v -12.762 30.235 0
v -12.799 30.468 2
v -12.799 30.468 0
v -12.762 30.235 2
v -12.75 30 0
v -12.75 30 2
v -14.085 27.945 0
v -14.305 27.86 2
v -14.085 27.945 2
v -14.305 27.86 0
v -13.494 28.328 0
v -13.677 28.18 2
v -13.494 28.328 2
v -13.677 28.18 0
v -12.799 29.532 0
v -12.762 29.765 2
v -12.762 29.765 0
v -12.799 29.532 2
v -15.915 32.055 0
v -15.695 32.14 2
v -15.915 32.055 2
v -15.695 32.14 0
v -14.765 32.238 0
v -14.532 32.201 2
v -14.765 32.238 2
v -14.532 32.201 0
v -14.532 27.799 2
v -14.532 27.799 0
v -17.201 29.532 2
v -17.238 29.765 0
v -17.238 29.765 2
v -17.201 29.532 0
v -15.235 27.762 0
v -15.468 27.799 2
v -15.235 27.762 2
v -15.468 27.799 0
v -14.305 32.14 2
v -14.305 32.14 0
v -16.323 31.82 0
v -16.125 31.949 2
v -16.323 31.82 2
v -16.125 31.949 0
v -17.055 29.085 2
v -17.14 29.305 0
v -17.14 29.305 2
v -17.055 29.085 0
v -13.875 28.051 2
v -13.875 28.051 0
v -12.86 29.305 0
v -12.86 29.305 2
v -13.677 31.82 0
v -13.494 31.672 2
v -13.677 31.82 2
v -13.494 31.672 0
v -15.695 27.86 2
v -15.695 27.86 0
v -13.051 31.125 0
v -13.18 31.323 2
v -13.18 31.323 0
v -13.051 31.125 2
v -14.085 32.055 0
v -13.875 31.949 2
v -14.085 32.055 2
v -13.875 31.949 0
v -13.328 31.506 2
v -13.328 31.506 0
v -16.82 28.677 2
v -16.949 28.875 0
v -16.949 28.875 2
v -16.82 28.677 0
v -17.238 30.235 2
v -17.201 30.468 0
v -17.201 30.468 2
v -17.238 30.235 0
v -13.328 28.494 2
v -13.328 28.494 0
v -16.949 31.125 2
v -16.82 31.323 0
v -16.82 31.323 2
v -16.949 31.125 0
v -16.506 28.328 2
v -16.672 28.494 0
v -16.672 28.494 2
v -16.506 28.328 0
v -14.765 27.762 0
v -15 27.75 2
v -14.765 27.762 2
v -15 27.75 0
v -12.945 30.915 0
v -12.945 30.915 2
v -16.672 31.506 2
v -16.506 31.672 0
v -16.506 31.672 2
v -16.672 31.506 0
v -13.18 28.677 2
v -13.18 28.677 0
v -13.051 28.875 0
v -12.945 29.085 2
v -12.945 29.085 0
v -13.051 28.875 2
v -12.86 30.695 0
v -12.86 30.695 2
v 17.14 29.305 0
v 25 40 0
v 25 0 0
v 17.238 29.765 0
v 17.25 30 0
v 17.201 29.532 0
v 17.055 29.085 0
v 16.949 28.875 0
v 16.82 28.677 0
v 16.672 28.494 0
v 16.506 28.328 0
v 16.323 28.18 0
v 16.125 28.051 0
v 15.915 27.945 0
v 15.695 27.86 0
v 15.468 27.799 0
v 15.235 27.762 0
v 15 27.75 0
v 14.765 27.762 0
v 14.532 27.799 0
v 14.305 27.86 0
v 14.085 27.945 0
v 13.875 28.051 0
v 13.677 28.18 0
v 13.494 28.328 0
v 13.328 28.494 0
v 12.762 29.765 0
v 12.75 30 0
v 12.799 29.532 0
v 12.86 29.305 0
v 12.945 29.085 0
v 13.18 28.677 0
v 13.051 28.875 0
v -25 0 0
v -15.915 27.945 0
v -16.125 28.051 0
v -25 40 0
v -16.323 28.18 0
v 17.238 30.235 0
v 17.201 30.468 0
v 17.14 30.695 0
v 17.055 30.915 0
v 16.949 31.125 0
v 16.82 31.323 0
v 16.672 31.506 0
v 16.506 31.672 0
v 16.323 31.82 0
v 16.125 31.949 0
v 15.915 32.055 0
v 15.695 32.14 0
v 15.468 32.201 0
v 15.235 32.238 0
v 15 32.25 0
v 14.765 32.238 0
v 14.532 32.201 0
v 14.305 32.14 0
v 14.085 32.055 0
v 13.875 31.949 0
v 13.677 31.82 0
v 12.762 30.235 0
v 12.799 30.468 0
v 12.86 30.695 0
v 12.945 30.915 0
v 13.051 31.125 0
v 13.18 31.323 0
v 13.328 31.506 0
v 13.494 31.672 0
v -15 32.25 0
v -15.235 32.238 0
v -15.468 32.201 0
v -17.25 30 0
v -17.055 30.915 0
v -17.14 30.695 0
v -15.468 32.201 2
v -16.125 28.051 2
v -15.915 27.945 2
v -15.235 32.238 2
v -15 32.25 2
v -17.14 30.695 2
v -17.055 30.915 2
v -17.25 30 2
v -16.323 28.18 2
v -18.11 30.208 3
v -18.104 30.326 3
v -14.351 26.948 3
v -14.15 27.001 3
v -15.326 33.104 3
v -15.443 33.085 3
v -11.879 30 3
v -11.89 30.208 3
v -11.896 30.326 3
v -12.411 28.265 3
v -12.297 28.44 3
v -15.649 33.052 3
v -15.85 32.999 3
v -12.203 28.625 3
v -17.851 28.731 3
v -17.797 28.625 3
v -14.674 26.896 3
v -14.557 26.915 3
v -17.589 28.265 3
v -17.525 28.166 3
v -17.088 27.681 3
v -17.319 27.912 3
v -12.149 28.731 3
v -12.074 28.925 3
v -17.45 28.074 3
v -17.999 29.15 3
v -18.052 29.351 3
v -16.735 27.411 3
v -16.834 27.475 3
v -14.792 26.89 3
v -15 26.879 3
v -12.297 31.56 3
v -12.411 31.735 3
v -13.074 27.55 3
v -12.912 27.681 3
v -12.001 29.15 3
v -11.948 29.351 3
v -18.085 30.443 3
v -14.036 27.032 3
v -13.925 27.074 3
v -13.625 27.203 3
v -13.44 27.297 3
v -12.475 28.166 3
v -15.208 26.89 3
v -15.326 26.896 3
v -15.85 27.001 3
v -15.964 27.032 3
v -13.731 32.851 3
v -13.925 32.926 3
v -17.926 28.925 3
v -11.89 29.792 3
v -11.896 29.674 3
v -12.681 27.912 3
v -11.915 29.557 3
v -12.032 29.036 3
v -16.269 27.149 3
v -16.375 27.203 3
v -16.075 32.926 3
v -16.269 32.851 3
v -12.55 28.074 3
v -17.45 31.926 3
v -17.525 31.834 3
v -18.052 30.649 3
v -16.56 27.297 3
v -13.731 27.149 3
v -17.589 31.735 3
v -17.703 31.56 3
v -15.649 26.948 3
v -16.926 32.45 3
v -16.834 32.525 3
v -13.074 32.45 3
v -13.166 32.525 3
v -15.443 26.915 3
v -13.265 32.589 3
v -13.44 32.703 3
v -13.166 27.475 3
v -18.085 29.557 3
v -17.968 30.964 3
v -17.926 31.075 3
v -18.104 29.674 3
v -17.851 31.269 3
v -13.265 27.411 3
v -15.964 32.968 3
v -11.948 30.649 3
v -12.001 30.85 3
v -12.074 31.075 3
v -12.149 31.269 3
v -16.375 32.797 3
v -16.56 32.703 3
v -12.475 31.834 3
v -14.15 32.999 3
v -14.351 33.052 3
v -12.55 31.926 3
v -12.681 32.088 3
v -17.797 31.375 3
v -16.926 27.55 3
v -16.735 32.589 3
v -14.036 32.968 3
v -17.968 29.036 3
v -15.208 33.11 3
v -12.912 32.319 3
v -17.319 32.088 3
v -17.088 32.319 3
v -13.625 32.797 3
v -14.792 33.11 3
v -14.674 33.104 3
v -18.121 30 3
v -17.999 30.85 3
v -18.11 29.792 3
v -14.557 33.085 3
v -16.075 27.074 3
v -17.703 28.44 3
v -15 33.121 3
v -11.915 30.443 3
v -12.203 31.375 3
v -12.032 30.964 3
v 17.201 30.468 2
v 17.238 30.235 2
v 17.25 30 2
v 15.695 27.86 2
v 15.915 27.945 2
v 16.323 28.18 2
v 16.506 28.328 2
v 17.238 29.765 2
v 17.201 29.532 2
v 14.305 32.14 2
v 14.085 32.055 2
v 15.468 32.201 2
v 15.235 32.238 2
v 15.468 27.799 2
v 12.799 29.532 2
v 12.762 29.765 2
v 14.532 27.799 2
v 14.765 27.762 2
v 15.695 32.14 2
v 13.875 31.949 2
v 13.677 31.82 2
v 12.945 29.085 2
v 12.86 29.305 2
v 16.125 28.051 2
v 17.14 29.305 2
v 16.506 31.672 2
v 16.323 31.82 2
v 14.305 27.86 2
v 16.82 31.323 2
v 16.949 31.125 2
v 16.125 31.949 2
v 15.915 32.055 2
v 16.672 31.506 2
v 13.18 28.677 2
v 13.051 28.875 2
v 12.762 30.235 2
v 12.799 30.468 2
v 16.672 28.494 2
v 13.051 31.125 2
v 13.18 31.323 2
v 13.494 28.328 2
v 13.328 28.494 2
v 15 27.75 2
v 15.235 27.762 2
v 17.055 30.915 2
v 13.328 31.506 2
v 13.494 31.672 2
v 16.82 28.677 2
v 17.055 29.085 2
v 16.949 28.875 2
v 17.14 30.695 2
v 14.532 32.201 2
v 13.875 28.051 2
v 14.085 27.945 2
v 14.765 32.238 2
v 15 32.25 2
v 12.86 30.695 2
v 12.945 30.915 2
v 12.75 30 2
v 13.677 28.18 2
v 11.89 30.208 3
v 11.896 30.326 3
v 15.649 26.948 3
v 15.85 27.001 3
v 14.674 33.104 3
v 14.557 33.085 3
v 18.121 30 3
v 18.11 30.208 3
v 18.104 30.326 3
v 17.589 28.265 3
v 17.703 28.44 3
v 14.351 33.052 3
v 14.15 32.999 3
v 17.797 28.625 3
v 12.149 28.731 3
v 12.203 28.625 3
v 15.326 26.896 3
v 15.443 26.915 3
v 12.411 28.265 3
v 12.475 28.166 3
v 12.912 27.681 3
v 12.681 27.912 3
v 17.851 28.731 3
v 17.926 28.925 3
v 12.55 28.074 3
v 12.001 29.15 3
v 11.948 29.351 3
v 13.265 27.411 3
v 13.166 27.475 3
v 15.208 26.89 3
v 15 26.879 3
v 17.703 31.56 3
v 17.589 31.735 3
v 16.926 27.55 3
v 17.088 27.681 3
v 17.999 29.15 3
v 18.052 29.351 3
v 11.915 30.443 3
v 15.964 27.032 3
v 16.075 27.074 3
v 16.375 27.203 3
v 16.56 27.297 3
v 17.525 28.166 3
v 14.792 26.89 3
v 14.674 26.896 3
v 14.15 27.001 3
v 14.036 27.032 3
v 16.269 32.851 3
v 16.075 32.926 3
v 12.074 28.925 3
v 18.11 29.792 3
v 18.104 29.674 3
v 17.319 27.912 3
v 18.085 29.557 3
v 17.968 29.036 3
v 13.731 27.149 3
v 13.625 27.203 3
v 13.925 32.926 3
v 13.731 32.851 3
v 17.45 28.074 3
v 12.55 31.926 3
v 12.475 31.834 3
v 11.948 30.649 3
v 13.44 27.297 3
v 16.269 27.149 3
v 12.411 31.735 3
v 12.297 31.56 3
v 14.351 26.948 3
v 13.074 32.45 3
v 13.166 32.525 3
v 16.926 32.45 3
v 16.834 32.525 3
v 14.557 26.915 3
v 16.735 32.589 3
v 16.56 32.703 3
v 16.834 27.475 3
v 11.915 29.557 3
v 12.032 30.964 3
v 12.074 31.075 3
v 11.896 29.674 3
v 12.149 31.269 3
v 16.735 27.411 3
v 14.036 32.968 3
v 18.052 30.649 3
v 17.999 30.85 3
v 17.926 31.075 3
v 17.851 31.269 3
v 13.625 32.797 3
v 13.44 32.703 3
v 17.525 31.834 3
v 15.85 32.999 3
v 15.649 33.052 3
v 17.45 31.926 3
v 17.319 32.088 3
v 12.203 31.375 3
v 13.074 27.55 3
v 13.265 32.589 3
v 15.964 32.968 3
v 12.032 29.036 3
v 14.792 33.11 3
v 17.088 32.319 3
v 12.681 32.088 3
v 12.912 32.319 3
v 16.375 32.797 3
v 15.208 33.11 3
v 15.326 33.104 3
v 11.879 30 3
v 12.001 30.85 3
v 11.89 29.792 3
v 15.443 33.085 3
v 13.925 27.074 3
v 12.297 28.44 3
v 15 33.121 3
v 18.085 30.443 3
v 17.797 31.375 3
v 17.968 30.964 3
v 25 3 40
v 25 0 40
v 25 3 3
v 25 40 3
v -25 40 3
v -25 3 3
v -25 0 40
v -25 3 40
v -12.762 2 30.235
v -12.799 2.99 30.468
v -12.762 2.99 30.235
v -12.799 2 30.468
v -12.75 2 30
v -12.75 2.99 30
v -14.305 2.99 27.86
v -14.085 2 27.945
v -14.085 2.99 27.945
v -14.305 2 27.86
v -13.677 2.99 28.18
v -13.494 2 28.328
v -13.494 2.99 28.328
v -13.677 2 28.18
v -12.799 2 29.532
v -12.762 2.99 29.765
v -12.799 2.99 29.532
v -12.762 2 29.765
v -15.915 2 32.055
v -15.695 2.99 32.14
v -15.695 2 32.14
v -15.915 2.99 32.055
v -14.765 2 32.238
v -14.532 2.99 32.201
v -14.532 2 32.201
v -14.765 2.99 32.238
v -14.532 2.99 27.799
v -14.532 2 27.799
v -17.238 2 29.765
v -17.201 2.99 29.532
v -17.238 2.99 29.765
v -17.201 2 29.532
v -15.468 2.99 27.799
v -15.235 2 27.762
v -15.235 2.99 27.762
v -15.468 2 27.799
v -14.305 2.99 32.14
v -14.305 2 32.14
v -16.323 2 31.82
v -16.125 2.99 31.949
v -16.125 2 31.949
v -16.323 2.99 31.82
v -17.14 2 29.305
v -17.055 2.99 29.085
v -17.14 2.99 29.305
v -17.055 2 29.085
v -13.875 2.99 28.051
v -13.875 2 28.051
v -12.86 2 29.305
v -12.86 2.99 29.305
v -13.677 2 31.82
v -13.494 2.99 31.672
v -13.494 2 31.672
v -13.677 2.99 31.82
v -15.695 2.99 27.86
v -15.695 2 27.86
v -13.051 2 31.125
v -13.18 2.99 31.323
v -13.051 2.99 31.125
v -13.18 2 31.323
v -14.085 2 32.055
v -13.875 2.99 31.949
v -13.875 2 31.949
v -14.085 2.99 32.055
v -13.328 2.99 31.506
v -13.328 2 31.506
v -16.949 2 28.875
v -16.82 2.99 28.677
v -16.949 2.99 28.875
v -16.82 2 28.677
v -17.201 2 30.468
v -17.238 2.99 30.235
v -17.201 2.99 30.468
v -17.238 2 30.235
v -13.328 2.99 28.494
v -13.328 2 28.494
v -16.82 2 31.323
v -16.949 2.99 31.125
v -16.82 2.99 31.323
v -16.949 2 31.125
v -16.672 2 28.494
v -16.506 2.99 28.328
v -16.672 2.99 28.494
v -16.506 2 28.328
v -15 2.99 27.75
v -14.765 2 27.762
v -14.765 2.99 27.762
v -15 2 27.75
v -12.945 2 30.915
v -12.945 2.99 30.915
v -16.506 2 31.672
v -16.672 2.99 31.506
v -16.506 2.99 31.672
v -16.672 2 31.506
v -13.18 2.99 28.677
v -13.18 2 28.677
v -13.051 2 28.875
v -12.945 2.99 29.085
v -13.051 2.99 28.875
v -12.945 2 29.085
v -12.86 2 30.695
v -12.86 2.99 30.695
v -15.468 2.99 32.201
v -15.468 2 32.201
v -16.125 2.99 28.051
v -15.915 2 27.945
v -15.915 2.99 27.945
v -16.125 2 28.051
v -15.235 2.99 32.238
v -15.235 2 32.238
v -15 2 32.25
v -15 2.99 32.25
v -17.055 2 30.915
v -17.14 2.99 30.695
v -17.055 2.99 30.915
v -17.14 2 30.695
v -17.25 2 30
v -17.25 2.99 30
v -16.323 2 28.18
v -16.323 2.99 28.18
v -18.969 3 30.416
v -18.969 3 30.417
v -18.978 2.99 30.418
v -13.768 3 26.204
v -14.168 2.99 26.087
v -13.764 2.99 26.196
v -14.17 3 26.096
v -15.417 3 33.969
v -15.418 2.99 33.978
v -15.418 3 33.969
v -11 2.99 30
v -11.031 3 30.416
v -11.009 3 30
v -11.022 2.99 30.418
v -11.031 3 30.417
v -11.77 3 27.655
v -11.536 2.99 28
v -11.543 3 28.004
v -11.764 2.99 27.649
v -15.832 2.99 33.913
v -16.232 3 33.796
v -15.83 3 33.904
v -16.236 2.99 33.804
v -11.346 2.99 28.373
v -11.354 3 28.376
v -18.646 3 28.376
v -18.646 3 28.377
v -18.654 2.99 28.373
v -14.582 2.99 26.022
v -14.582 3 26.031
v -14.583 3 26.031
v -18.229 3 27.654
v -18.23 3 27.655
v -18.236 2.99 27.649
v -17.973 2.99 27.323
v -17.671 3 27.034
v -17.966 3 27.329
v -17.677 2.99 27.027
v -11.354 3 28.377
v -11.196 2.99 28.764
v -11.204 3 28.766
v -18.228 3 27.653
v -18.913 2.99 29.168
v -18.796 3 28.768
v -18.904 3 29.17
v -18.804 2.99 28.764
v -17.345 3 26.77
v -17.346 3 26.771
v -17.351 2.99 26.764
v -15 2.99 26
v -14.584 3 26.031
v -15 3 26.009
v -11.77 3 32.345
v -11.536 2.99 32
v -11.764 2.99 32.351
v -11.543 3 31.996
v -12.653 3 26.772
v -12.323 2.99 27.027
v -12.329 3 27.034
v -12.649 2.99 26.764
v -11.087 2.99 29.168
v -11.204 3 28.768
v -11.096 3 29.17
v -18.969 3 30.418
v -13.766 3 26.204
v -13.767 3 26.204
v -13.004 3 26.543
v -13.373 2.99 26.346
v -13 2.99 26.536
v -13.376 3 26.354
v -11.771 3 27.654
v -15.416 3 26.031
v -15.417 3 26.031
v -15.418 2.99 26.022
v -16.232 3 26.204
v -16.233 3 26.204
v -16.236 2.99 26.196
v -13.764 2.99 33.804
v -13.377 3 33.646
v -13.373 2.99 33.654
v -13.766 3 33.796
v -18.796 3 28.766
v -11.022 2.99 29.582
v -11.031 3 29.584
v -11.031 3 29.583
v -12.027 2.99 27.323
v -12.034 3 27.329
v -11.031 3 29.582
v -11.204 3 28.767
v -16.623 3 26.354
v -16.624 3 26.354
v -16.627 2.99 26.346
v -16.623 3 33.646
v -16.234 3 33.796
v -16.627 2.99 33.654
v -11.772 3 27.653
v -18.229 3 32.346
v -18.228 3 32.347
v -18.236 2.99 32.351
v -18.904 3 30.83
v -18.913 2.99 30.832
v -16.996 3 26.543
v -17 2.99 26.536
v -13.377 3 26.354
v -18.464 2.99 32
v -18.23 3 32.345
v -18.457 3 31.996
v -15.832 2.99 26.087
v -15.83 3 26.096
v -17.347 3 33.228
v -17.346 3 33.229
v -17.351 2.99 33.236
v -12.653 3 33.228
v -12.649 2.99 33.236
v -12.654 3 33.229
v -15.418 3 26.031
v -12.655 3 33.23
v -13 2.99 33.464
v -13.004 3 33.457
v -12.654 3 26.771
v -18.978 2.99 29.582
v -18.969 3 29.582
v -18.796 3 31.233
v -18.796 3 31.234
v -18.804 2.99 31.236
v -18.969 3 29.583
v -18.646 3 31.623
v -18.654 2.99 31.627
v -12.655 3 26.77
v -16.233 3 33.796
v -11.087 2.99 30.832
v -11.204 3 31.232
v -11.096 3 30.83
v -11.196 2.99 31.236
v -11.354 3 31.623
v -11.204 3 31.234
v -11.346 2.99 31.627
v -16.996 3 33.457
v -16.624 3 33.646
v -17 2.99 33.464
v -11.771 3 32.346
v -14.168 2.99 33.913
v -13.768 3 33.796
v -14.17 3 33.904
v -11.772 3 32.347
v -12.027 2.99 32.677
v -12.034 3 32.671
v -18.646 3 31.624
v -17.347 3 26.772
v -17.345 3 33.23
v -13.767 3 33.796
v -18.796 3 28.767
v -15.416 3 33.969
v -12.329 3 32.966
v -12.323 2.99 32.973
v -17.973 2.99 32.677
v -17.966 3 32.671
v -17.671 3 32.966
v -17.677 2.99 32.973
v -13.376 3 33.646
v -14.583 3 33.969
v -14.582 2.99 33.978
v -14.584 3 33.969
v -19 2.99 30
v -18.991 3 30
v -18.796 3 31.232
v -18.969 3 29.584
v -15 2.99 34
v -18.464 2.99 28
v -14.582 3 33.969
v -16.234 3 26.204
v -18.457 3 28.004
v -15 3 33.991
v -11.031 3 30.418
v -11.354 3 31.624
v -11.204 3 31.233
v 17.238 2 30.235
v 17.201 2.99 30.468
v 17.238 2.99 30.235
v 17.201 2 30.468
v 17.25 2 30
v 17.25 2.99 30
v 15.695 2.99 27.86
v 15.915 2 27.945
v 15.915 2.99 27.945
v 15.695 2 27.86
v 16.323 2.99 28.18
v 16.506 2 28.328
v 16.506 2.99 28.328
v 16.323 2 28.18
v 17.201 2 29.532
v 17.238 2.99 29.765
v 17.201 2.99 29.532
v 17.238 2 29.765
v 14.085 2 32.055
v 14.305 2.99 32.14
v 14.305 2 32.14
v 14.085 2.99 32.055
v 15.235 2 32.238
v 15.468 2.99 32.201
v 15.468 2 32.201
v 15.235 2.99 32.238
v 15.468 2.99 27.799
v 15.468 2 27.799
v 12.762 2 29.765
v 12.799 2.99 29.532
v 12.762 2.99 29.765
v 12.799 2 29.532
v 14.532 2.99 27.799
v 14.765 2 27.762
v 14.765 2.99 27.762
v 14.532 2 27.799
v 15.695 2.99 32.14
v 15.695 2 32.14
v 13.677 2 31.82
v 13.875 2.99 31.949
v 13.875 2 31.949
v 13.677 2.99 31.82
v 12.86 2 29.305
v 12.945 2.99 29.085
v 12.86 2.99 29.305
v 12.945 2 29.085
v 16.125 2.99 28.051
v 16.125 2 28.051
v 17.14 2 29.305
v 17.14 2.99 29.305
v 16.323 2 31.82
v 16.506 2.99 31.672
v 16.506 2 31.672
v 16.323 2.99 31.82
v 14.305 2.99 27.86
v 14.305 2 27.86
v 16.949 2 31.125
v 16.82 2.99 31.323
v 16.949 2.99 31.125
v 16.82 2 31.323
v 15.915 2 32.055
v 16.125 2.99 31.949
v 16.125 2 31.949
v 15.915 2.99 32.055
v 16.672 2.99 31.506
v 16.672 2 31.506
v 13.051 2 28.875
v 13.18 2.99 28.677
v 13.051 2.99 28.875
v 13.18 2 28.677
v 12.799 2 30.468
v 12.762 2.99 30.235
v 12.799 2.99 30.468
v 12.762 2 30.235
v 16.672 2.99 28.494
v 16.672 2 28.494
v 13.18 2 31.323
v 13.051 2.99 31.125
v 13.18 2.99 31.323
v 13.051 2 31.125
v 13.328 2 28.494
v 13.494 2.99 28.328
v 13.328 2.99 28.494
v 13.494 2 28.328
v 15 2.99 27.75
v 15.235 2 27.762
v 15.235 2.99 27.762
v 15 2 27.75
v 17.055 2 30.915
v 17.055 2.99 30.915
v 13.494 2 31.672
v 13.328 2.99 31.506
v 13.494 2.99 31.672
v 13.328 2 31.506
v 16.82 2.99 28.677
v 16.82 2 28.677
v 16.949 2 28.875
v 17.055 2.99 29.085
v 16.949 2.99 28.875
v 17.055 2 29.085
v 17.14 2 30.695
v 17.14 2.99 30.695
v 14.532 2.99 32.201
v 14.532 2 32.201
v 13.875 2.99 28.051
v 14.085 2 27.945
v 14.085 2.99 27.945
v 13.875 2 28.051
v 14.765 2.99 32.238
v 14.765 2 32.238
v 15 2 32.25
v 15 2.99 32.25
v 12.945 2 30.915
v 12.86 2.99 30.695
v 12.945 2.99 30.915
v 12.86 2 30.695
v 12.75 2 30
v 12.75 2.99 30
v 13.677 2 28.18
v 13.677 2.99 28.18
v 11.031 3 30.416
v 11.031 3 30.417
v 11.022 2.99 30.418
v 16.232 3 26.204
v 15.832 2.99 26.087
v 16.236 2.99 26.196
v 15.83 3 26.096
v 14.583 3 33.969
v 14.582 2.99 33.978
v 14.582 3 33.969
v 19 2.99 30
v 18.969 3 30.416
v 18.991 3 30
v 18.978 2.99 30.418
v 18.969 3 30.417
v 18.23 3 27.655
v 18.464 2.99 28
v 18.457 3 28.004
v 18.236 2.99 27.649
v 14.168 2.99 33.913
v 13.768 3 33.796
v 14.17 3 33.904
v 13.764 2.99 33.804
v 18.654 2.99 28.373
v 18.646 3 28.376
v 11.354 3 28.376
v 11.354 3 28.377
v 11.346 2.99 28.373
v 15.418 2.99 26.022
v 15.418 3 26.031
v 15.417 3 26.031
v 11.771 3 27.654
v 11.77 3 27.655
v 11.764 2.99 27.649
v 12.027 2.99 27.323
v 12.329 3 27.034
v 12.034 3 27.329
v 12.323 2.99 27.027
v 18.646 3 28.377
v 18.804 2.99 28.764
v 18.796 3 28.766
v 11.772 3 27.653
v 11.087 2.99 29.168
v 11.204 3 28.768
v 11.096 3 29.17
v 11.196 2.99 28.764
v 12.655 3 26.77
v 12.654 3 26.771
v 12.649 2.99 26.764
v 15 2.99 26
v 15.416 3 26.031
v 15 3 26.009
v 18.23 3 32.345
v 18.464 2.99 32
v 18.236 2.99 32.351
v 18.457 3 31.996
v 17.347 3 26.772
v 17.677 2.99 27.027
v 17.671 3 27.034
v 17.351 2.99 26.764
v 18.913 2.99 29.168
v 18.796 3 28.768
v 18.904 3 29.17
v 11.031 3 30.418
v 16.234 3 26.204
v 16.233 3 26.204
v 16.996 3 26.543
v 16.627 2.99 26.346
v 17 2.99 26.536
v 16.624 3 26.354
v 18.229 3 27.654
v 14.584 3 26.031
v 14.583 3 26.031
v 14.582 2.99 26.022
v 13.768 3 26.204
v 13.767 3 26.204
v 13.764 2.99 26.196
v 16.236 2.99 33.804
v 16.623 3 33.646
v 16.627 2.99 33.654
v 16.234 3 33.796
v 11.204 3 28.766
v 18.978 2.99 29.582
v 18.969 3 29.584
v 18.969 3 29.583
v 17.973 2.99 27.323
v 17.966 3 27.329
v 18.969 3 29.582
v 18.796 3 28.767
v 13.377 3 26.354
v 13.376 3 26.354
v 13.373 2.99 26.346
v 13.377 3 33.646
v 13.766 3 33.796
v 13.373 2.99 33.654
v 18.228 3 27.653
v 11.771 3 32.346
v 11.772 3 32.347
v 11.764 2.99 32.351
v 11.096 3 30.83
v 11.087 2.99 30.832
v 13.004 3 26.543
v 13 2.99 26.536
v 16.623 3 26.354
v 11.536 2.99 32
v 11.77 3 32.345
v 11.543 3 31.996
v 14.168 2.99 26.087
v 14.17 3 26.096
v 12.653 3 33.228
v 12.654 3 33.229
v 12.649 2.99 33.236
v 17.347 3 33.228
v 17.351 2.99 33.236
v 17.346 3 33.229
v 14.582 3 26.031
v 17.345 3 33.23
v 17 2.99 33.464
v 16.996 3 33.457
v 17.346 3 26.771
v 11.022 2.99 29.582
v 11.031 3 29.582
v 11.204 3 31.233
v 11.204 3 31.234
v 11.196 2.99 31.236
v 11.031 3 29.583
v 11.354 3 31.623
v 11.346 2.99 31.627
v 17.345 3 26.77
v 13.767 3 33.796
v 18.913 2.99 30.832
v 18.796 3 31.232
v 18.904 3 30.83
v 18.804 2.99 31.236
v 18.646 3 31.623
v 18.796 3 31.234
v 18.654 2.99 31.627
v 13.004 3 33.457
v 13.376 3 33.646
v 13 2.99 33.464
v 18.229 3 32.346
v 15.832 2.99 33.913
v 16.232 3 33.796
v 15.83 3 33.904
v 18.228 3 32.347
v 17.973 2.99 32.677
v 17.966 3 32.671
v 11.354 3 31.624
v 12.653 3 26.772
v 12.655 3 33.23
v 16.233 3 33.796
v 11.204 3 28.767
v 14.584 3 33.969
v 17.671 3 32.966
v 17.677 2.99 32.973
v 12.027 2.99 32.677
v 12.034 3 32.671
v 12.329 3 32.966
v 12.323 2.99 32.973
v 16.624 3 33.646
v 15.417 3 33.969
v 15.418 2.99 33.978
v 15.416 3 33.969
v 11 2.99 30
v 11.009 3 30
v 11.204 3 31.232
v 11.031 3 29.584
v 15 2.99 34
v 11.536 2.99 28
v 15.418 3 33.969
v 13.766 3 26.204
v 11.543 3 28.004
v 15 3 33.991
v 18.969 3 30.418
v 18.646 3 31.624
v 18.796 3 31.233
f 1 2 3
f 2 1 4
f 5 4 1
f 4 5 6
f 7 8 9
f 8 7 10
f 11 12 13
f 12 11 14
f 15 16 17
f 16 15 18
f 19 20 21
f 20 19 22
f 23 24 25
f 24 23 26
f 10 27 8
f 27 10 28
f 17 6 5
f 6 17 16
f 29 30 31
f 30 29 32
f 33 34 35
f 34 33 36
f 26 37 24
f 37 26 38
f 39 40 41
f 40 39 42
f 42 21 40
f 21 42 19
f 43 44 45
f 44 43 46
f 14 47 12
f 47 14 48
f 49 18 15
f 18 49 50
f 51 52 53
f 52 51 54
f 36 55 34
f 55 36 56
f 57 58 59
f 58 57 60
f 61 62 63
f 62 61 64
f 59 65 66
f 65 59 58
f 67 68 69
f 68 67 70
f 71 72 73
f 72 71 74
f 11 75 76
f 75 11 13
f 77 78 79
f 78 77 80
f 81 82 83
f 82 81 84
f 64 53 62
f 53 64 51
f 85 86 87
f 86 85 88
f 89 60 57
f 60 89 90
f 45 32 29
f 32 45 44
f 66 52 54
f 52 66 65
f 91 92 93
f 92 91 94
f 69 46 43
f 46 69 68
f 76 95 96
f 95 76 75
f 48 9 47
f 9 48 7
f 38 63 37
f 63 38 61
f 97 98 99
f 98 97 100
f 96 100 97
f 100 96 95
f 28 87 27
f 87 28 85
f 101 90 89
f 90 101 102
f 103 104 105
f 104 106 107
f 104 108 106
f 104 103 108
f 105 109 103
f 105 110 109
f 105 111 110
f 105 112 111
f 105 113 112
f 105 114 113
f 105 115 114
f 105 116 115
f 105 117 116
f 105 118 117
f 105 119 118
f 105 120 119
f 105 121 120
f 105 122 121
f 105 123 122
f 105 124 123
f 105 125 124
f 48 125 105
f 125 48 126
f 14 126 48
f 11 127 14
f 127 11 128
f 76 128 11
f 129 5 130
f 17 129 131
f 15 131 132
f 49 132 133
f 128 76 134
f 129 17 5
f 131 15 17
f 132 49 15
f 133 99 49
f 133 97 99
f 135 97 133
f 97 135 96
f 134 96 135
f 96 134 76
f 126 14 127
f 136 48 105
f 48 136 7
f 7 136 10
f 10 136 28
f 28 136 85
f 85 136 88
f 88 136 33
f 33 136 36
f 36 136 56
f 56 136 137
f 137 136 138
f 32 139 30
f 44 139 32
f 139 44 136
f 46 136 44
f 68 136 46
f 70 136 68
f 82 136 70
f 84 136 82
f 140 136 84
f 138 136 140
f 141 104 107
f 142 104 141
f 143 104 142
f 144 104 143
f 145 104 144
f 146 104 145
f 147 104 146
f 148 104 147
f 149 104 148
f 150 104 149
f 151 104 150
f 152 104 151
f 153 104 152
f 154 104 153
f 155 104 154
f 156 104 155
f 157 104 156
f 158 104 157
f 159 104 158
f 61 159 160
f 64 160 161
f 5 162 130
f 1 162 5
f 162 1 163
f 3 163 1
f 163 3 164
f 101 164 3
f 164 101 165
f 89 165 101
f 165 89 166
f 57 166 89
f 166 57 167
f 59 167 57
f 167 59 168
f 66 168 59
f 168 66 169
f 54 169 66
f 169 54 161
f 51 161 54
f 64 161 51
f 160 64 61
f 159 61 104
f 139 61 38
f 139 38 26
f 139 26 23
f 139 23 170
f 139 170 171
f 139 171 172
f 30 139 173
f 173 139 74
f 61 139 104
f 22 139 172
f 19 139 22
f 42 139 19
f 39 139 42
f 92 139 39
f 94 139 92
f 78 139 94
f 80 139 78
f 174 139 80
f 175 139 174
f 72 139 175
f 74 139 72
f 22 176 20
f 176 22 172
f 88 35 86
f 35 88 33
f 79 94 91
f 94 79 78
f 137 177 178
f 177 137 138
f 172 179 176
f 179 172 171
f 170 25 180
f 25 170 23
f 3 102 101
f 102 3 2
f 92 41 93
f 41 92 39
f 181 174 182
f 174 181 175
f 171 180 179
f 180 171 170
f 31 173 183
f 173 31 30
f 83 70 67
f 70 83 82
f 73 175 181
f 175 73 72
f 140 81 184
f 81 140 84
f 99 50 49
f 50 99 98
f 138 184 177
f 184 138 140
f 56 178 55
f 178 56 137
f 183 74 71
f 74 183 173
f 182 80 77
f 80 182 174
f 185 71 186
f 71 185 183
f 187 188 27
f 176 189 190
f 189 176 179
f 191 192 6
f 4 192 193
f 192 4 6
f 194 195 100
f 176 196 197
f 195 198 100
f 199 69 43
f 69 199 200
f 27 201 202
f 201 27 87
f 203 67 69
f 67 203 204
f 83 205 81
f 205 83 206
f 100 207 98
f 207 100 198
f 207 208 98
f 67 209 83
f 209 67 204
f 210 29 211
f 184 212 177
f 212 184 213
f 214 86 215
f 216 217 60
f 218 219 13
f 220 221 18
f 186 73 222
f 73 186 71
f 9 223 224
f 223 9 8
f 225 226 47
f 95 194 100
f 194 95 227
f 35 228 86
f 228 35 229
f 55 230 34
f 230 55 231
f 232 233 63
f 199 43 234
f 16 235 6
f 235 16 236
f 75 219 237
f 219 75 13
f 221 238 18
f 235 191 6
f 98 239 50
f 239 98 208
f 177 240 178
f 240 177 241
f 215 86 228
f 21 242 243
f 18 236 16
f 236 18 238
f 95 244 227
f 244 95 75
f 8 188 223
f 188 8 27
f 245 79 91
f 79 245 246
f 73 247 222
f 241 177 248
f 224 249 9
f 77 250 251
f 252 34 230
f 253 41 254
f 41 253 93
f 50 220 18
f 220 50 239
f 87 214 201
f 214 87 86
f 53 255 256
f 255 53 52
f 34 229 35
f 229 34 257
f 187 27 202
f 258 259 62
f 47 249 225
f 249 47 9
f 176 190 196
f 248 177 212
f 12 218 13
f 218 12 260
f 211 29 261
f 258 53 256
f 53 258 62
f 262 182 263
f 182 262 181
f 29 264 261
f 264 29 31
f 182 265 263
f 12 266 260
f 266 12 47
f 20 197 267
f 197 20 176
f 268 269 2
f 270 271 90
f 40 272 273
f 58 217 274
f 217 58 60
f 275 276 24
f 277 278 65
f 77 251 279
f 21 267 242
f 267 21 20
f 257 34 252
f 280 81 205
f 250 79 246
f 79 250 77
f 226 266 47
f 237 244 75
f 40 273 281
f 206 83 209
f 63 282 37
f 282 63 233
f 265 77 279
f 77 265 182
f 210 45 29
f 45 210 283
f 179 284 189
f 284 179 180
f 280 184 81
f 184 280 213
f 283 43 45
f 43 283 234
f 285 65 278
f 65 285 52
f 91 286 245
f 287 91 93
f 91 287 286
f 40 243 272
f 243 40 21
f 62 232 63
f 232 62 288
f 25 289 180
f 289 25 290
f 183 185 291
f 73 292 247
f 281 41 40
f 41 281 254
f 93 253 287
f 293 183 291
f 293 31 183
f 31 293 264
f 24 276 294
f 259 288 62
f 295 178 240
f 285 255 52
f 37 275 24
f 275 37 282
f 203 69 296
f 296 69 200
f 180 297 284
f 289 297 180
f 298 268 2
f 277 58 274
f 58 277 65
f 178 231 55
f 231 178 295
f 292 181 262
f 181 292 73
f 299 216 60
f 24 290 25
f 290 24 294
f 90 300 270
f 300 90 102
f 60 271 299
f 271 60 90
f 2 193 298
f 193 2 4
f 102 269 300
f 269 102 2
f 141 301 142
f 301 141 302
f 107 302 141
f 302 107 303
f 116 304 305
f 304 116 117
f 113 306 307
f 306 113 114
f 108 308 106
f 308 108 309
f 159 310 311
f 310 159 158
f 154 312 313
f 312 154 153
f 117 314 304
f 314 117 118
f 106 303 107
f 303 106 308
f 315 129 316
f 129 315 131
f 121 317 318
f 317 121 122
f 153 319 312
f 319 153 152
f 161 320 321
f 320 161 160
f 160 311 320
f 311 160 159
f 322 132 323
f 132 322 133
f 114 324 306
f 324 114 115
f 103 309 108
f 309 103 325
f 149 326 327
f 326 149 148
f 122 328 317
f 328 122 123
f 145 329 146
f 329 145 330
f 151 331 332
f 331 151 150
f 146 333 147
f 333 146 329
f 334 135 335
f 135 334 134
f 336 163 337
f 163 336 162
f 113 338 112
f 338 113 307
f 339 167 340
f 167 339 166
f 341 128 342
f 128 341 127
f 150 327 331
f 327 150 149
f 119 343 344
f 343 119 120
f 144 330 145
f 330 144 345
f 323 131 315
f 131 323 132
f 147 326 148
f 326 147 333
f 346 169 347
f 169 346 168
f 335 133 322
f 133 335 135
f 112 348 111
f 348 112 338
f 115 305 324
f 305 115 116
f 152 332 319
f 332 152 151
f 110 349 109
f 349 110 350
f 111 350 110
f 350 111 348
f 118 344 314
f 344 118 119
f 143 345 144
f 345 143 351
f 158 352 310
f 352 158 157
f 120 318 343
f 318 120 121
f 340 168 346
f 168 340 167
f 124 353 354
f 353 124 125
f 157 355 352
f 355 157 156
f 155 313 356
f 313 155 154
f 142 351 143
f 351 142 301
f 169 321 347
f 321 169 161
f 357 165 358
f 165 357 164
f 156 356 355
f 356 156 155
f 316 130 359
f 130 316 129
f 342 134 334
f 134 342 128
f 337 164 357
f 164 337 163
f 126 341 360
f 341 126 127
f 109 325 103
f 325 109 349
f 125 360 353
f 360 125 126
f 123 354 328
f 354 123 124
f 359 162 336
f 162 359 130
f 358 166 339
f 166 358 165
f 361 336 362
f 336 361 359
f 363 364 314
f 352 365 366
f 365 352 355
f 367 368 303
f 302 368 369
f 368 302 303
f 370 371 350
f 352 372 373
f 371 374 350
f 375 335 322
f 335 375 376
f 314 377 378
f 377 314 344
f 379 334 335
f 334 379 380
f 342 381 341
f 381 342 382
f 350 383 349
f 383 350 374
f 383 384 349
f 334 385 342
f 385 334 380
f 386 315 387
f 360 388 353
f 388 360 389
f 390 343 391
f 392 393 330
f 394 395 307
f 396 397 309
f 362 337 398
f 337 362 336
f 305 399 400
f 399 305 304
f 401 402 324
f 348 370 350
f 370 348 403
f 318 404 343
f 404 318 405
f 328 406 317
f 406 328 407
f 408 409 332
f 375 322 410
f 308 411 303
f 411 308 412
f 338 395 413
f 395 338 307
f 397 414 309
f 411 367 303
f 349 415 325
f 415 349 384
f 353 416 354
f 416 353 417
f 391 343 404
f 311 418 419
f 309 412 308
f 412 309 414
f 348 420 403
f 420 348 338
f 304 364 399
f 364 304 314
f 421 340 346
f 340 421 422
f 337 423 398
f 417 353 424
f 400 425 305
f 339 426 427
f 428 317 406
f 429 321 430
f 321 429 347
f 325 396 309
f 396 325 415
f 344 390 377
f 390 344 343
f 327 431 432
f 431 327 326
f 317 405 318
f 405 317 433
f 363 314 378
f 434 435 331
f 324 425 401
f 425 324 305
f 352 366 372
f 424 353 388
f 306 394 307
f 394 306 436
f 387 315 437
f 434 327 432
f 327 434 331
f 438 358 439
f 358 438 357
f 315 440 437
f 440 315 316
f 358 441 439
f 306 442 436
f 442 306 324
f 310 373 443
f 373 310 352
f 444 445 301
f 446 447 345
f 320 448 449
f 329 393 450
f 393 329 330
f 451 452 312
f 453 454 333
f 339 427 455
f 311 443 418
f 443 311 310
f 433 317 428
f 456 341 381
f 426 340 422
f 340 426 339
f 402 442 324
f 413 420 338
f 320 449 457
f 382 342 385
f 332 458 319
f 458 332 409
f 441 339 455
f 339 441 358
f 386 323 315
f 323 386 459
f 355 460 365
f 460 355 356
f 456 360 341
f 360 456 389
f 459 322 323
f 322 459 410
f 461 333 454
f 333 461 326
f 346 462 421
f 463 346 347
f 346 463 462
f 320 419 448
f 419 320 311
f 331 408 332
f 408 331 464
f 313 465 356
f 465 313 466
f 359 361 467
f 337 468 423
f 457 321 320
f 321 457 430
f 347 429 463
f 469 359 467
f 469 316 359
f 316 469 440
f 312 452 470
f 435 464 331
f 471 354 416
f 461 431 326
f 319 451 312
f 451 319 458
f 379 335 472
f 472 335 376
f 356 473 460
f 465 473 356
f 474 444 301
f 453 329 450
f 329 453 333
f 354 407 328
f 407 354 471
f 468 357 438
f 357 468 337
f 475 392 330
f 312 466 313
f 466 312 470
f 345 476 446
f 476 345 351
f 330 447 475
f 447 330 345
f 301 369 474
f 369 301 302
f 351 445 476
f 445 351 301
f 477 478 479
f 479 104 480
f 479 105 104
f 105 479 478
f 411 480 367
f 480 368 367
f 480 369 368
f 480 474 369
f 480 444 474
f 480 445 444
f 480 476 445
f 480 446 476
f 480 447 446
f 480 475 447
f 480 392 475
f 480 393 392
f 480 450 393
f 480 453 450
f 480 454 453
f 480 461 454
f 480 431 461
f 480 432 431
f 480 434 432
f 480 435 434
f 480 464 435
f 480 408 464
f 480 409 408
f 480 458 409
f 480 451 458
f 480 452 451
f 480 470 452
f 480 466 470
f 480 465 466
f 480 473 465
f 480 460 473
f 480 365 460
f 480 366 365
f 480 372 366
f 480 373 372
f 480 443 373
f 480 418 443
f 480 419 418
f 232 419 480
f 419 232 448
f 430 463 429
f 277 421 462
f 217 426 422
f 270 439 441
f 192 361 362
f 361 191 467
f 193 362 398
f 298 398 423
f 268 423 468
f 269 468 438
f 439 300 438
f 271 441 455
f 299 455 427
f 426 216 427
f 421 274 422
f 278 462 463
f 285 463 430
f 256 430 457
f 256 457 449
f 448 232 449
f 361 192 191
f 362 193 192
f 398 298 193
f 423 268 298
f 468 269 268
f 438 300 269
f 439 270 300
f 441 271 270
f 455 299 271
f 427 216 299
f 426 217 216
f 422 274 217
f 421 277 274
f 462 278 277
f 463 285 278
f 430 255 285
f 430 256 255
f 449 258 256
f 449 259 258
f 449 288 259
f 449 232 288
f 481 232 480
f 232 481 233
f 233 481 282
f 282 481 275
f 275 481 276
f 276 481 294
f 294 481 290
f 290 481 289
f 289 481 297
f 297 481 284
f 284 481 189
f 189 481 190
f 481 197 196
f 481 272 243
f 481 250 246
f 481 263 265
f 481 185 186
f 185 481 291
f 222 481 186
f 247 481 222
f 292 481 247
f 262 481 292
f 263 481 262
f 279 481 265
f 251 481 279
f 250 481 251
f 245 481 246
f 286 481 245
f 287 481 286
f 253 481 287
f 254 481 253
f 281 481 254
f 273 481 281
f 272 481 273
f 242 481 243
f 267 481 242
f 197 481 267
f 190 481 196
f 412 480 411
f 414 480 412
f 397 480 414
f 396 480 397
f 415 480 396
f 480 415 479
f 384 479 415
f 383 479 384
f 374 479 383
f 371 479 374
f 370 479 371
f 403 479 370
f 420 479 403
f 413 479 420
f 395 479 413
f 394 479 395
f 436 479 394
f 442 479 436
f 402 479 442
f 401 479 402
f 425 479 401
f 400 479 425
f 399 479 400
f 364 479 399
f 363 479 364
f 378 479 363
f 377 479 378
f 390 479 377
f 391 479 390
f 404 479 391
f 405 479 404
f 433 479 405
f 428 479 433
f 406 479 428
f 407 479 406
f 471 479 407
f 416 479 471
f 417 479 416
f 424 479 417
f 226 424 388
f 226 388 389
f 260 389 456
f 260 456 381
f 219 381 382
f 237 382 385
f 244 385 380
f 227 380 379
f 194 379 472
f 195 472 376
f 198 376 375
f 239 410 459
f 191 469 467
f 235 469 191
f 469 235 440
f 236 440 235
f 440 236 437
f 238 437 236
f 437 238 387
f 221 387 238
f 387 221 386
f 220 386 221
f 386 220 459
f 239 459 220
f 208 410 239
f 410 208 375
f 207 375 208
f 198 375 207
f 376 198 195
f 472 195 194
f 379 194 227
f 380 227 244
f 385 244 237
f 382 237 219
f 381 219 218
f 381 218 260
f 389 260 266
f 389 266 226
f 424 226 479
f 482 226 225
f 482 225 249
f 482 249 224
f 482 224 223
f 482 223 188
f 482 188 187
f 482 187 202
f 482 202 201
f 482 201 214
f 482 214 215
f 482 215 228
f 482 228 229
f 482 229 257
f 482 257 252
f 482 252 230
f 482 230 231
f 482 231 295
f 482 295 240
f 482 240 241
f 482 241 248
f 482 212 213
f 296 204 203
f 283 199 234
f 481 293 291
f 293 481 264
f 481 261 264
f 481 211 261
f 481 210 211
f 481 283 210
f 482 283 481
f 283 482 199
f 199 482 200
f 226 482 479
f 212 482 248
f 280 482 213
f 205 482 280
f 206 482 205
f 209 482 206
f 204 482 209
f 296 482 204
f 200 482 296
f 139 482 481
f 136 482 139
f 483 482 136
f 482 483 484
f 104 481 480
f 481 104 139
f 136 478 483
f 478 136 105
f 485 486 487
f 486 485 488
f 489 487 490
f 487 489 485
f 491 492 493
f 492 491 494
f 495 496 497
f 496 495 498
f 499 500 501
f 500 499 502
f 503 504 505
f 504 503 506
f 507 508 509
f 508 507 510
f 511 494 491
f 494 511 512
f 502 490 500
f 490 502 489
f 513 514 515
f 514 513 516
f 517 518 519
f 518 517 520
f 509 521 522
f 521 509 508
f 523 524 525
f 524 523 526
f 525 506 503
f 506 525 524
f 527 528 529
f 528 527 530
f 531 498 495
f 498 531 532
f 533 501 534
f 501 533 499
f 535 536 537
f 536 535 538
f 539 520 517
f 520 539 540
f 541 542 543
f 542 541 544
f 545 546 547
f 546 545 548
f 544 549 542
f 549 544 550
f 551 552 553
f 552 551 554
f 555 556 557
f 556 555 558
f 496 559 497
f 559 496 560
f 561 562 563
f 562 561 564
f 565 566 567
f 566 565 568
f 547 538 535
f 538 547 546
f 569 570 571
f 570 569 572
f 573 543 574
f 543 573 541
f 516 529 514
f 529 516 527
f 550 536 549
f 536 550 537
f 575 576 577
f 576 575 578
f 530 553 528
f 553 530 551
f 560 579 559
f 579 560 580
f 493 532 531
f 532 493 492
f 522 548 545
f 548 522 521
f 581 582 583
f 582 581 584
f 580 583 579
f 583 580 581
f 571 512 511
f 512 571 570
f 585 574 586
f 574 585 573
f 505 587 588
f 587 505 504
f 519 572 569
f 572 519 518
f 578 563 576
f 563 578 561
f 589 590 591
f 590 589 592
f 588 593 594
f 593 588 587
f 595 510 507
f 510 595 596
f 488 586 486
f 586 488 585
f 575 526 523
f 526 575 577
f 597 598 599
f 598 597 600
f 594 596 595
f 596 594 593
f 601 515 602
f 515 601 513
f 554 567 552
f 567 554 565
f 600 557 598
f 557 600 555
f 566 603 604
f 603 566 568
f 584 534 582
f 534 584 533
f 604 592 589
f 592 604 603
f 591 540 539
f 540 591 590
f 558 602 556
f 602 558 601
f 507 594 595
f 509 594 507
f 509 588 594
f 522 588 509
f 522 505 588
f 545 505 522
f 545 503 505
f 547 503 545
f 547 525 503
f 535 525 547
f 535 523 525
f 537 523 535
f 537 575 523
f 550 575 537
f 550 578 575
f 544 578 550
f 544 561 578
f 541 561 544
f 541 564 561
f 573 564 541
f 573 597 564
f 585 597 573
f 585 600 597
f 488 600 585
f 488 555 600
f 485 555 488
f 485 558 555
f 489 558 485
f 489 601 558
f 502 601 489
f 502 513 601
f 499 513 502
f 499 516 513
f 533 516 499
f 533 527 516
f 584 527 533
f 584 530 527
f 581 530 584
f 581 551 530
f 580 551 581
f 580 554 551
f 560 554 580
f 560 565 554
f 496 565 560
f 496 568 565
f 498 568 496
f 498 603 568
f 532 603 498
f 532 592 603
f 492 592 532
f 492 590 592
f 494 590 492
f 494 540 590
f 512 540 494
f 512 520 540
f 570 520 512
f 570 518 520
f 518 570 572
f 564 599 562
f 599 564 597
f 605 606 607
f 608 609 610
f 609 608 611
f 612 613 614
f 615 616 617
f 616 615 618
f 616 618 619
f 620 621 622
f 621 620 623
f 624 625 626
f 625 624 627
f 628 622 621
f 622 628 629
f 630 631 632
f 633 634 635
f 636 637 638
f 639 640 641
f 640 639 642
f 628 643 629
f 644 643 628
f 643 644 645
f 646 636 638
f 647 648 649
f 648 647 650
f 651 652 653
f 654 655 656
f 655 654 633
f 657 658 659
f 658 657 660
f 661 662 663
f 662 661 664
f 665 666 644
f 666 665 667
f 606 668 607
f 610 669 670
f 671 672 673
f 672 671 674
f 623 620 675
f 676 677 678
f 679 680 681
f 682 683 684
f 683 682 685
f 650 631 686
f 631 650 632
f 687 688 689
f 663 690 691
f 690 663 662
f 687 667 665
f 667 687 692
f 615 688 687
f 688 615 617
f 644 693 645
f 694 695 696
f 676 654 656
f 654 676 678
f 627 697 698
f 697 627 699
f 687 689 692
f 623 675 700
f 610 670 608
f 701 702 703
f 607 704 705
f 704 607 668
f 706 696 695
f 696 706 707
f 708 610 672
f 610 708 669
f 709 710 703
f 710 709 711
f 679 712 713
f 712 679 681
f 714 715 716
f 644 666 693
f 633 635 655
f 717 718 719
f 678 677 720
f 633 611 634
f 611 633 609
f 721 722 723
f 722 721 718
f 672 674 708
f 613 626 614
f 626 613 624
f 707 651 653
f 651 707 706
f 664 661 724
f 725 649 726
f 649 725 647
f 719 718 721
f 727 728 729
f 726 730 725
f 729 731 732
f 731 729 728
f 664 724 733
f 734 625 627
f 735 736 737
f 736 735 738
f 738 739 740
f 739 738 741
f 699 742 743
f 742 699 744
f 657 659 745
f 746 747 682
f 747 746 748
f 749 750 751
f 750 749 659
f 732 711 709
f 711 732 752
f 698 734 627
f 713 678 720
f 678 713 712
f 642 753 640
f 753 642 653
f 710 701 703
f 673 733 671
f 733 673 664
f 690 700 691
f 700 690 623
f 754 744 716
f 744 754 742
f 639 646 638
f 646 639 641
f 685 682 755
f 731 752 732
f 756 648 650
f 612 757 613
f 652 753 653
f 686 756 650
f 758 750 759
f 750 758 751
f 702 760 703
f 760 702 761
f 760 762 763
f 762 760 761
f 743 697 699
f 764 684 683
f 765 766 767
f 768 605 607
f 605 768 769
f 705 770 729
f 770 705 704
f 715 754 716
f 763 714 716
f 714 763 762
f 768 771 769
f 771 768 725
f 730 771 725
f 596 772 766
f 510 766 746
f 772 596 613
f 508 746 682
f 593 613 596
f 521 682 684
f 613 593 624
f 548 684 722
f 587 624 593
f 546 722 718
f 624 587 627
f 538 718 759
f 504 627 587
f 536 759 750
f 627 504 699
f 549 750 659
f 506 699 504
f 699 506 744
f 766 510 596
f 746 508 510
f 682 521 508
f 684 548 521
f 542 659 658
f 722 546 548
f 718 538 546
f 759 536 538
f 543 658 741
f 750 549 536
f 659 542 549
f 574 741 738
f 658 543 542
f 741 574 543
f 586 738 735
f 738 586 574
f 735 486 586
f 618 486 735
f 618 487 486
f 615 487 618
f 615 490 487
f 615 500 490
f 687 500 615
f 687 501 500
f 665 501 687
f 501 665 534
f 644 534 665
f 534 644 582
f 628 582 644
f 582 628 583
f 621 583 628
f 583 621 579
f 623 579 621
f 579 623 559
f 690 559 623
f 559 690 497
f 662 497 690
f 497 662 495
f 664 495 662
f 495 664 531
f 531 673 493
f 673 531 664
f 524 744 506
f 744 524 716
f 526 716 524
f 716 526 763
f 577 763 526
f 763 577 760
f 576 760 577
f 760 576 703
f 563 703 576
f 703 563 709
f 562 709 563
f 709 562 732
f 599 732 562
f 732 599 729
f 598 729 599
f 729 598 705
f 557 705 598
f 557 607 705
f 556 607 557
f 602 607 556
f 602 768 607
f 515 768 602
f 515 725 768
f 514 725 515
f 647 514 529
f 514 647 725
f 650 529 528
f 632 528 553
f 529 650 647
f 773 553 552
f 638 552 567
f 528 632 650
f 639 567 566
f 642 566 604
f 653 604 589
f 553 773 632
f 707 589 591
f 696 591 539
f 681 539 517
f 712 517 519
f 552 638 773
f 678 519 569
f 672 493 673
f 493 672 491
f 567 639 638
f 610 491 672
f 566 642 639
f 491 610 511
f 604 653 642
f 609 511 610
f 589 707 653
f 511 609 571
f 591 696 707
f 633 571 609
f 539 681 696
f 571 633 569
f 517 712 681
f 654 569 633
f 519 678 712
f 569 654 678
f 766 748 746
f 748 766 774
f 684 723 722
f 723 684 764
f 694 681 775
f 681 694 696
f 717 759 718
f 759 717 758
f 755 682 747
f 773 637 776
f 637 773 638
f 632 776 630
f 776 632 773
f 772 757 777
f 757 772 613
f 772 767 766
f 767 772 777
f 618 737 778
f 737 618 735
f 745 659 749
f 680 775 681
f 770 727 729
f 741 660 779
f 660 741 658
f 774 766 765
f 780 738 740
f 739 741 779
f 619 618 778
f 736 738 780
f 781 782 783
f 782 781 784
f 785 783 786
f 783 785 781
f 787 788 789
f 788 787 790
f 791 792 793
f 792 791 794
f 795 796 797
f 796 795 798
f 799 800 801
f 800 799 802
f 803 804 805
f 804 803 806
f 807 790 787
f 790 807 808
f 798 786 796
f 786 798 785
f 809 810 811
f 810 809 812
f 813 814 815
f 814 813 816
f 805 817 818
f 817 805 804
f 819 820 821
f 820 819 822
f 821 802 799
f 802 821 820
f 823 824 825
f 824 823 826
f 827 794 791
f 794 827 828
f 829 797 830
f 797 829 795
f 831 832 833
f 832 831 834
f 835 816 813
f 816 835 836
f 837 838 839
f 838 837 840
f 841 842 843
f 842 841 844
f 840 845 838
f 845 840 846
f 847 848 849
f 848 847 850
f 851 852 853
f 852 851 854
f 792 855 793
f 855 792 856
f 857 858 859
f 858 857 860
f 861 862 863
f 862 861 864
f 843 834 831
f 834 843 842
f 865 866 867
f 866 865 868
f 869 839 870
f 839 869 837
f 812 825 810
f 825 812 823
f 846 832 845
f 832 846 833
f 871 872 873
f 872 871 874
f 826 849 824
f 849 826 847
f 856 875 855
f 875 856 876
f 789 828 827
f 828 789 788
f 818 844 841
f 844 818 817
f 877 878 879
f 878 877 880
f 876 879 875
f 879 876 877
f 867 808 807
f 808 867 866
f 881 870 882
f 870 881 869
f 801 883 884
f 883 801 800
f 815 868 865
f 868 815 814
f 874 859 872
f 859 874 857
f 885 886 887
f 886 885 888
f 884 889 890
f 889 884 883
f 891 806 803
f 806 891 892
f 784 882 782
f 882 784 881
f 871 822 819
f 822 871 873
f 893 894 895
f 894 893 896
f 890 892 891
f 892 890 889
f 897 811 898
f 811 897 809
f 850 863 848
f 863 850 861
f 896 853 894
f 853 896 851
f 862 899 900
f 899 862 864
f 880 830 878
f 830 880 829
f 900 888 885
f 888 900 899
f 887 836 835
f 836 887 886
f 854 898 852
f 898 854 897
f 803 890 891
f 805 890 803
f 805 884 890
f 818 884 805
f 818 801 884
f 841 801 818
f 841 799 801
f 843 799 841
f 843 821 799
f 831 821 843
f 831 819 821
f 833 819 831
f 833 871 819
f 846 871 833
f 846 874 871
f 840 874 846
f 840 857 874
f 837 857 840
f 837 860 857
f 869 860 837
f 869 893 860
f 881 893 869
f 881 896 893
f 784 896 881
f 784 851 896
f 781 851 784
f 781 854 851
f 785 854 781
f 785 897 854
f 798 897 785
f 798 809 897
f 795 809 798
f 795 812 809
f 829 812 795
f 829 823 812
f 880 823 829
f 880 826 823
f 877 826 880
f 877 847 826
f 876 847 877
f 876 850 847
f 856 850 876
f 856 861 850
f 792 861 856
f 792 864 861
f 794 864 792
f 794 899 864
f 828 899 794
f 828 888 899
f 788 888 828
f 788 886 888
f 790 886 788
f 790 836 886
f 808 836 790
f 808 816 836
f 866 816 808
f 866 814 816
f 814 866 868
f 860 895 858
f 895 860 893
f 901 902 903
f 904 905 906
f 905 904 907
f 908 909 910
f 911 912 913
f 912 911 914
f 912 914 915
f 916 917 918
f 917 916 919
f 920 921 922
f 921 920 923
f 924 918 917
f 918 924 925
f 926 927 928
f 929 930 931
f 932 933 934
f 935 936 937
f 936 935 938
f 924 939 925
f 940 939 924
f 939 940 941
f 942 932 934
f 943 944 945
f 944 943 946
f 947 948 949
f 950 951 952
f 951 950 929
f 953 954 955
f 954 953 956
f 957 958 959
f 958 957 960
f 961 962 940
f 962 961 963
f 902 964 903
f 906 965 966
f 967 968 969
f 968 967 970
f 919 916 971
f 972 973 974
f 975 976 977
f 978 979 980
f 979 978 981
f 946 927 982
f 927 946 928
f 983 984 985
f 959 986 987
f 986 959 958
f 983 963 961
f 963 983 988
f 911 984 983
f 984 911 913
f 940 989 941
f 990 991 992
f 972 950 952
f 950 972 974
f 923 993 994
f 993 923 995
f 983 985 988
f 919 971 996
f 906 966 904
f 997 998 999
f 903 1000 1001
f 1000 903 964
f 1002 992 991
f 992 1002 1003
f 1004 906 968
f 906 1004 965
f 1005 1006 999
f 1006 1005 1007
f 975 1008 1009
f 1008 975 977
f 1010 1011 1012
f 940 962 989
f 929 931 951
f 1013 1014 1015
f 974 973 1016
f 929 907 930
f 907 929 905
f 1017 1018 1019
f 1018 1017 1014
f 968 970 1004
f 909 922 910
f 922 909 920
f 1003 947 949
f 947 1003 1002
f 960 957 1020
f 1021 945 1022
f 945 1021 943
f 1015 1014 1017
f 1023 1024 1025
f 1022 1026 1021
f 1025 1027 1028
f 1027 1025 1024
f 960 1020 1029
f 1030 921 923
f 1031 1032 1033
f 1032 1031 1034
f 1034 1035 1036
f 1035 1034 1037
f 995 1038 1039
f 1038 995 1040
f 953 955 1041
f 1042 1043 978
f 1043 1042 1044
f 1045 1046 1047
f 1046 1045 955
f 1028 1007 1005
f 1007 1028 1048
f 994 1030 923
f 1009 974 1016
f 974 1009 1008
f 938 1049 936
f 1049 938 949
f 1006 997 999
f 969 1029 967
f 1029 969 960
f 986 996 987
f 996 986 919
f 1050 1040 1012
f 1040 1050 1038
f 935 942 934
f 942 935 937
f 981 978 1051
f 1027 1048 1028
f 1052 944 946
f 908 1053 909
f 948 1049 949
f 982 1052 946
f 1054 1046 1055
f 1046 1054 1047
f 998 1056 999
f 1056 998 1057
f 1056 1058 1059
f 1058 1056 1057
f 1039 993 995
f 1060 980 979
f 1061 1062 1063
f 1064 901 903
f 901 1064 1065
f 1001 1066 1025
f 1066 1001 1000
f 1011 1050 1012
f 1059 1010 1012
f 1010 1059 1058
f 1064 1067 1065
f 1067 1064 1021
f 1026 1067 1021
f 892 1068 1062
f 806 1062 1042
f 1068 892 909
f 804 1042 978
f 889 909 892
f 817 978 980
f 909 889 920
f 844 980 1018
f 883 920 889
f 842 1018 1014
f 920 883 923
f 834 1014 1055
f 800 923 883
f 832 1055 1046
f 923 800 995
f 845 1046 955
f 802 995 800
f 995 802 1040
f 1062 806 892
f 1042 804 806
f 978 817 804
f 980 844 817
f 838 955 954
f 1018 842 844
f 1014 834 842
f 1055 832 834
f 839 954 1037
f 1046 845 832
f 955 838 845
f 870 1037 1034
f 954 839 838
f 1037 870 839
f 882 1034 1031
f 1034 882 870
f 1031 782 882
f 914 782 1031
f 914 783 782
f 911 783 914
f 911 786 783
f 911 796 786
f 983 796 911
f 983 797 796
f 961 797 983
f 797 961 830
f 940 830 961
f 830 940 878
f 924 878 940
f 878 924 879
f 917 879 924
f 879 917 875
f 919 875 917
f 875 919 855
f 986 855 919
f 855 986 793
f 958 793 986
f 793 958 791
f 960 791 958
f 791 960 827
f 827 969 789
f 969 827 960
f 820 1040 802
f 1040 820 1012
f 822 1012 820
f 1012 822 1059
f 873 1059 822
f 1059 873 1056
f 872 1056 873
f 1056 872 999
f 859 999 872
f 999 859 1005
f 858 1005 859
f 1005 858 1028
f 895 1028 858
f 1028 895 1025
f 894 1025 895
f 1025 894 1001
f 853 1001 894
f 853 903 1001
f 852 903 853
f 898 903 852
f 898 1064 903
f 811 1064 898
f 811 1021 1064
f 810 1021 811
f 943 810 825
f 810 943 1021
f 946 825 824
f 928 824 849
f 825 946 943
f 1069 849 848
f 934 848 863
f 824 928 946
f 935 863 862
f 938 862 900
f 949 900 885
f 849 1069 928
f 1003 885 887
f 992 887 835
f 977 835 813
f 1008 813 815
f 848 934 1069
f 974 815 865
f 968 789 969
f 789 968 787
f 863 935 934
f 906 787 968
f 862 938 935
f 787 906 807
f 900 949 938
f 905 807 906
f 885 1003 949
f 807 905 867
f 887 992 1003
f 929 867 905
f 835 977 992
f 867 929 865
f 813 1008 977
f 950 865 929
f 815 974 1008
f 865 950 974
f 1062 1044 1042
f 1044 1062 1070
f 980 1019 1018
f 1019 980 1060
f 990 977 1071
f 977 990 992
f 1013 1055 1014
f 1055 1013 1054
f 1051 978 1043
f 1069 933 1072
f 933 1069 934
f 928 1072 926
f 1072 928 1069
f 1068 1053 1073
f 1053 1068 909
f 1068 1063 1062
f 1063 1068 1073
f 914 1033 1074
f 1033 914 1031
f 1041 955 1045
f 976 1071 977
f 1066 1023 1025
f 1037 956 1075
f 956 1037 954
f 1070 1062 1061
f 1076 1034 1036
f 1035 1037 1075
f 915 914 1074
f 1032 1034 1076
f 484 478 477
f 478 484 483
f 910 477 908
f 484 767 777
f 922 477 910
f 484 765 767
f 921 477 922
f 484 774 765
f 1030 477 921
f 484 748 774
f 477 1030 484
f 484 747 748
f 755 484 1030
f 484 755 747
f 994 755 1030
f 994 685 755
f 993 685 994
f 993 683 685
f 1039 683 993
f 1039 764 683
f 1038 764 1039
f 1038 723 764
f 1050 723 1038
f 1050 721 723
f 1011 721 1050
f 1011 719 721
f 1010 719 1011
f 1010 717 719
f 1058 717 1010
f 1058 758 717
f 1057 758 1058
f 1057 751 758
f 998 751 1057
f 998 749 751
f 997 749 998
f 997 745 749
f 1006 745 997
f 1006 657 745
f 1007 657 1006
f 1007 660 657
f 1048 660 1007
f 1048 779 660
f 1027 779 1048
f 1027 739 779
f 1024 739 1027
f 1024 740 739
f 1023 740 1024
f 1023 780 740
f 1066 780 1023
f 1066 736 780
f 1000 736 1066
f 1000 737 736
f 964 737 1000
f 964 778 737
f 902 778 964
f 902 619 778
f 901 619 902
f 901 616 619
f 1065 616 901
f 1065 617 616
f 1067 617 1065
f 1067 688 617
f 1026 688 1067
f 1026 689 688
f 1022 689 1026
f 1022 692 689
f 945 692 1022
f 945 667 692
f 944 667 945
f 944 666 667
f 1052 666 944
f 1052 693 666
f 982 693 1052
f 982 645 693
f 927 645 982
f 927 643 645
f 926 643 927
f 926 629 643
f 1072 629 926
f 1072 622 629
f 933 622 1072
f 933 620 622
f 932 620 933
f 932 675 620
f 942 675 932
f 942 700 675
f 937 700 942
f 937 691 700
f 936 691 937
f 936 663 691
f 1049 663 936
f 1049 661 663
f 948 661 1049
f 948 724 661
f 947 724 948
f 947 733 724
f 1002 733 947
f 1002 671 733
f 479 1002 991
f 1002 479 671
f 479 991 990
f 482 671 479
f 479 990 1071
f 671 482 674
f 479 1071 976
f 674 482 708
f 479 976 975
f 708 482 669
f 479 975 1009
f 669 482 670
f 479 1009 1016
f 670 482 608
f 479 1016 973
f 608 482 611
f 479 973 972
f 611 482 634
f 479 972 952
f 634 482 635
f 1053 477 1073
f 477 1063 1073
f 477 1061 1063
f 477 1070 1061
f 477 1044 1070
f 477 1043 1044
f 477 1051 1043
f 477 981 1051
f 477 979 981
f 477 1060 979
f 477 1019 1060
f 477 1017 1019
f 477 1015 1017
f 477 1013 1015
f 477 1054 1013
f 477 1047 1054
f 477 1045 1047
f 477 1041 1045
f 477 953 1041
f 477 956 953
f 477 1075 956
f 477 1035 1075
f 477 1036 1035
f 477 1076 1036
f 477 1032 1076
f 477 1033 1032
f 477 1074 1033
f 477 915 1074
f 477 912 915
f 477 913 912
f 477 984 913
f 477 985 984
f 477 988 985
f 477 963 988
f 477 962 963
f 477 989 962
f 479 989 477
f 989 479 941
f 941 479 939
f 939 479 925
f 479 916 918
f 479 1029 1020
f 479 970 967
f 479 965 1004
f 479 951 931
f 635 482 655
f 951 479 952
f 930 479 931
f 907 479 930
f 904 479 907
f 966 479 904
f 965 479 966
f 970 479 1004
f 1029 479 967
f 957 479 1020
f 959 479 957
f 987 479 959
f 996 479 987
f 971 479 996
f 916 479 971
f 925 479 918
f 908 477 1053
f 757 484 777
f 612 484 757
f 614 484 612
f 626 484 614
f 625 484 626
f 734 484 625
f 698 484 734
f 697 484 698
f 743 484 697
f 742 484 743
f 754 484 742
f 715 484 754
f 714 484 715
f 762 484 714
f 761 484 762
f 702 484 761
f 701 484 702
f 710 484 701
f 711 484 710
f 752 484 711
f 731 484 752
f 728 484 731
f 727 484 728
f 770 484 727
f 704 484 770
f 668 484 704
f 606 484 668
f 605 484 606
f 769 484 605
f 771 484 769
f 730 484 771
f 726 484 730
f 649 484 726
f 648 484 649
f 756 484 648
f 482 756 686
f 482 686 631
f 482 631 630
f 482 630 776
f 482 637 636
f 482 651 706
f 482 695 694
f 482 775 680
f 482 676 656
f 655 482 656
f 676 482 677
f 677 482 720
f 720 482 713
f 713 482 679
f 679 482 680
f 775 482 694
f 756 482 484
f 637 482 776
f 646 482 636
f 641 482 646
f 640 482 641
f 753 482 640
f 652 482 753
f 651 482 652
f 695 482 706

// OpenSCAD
// L字金具
$fn = 60;

width = 50;
depth = 40;
height = 40;
thickness = 3;

hole_d = 4.5;
csk_d = 8;
csk_depth = 2;
edge_offset = 10;
hole_x_offset = width/2 - edge_offset;

module countersunk_hole(depth_total) {
    union() {
        translate([0,0,-1])
            cylinder(d=hole_d, h=depth_total+2);
        translate([0,0,depth_total-csk_depth])
            cylinder(d1=hole_d, d2=csk_d, h=csk_depth+0.01);
    }
}

module horizontal_flange() {
    difference() {
        translate([-width/2, 0, 0])
            cube([width, depth, thickness]);
        
        // 皿穴は上面(外側、+Z側)から見て皿座面が上(外側)
        for (x = [-hole_x_offset, hole_x_offset]) {
            translate([x, depth - edge_offset, 0])
                translate([0,0,thickness - csk_depth])
                countersunk_hole(thickness);
        }
    }
}

module vertical_flange() {
    difference() {
        translate([-width/2, 0, 0])
            cube([width, thickness, height]);
        
        // 皿穴は外側(+Y側)に皿座面
        for (x = [-hole_x_offset, hole_x_offset]) {
            translate([x, thickness, height - edge_offset])
                rotate([90,0,0])
                translate([0,0,-(thickness)])
                countersunk_hole(thickness);
        }
    }
}

// 組み立て
horizontal_flange();
vertical_flange();
